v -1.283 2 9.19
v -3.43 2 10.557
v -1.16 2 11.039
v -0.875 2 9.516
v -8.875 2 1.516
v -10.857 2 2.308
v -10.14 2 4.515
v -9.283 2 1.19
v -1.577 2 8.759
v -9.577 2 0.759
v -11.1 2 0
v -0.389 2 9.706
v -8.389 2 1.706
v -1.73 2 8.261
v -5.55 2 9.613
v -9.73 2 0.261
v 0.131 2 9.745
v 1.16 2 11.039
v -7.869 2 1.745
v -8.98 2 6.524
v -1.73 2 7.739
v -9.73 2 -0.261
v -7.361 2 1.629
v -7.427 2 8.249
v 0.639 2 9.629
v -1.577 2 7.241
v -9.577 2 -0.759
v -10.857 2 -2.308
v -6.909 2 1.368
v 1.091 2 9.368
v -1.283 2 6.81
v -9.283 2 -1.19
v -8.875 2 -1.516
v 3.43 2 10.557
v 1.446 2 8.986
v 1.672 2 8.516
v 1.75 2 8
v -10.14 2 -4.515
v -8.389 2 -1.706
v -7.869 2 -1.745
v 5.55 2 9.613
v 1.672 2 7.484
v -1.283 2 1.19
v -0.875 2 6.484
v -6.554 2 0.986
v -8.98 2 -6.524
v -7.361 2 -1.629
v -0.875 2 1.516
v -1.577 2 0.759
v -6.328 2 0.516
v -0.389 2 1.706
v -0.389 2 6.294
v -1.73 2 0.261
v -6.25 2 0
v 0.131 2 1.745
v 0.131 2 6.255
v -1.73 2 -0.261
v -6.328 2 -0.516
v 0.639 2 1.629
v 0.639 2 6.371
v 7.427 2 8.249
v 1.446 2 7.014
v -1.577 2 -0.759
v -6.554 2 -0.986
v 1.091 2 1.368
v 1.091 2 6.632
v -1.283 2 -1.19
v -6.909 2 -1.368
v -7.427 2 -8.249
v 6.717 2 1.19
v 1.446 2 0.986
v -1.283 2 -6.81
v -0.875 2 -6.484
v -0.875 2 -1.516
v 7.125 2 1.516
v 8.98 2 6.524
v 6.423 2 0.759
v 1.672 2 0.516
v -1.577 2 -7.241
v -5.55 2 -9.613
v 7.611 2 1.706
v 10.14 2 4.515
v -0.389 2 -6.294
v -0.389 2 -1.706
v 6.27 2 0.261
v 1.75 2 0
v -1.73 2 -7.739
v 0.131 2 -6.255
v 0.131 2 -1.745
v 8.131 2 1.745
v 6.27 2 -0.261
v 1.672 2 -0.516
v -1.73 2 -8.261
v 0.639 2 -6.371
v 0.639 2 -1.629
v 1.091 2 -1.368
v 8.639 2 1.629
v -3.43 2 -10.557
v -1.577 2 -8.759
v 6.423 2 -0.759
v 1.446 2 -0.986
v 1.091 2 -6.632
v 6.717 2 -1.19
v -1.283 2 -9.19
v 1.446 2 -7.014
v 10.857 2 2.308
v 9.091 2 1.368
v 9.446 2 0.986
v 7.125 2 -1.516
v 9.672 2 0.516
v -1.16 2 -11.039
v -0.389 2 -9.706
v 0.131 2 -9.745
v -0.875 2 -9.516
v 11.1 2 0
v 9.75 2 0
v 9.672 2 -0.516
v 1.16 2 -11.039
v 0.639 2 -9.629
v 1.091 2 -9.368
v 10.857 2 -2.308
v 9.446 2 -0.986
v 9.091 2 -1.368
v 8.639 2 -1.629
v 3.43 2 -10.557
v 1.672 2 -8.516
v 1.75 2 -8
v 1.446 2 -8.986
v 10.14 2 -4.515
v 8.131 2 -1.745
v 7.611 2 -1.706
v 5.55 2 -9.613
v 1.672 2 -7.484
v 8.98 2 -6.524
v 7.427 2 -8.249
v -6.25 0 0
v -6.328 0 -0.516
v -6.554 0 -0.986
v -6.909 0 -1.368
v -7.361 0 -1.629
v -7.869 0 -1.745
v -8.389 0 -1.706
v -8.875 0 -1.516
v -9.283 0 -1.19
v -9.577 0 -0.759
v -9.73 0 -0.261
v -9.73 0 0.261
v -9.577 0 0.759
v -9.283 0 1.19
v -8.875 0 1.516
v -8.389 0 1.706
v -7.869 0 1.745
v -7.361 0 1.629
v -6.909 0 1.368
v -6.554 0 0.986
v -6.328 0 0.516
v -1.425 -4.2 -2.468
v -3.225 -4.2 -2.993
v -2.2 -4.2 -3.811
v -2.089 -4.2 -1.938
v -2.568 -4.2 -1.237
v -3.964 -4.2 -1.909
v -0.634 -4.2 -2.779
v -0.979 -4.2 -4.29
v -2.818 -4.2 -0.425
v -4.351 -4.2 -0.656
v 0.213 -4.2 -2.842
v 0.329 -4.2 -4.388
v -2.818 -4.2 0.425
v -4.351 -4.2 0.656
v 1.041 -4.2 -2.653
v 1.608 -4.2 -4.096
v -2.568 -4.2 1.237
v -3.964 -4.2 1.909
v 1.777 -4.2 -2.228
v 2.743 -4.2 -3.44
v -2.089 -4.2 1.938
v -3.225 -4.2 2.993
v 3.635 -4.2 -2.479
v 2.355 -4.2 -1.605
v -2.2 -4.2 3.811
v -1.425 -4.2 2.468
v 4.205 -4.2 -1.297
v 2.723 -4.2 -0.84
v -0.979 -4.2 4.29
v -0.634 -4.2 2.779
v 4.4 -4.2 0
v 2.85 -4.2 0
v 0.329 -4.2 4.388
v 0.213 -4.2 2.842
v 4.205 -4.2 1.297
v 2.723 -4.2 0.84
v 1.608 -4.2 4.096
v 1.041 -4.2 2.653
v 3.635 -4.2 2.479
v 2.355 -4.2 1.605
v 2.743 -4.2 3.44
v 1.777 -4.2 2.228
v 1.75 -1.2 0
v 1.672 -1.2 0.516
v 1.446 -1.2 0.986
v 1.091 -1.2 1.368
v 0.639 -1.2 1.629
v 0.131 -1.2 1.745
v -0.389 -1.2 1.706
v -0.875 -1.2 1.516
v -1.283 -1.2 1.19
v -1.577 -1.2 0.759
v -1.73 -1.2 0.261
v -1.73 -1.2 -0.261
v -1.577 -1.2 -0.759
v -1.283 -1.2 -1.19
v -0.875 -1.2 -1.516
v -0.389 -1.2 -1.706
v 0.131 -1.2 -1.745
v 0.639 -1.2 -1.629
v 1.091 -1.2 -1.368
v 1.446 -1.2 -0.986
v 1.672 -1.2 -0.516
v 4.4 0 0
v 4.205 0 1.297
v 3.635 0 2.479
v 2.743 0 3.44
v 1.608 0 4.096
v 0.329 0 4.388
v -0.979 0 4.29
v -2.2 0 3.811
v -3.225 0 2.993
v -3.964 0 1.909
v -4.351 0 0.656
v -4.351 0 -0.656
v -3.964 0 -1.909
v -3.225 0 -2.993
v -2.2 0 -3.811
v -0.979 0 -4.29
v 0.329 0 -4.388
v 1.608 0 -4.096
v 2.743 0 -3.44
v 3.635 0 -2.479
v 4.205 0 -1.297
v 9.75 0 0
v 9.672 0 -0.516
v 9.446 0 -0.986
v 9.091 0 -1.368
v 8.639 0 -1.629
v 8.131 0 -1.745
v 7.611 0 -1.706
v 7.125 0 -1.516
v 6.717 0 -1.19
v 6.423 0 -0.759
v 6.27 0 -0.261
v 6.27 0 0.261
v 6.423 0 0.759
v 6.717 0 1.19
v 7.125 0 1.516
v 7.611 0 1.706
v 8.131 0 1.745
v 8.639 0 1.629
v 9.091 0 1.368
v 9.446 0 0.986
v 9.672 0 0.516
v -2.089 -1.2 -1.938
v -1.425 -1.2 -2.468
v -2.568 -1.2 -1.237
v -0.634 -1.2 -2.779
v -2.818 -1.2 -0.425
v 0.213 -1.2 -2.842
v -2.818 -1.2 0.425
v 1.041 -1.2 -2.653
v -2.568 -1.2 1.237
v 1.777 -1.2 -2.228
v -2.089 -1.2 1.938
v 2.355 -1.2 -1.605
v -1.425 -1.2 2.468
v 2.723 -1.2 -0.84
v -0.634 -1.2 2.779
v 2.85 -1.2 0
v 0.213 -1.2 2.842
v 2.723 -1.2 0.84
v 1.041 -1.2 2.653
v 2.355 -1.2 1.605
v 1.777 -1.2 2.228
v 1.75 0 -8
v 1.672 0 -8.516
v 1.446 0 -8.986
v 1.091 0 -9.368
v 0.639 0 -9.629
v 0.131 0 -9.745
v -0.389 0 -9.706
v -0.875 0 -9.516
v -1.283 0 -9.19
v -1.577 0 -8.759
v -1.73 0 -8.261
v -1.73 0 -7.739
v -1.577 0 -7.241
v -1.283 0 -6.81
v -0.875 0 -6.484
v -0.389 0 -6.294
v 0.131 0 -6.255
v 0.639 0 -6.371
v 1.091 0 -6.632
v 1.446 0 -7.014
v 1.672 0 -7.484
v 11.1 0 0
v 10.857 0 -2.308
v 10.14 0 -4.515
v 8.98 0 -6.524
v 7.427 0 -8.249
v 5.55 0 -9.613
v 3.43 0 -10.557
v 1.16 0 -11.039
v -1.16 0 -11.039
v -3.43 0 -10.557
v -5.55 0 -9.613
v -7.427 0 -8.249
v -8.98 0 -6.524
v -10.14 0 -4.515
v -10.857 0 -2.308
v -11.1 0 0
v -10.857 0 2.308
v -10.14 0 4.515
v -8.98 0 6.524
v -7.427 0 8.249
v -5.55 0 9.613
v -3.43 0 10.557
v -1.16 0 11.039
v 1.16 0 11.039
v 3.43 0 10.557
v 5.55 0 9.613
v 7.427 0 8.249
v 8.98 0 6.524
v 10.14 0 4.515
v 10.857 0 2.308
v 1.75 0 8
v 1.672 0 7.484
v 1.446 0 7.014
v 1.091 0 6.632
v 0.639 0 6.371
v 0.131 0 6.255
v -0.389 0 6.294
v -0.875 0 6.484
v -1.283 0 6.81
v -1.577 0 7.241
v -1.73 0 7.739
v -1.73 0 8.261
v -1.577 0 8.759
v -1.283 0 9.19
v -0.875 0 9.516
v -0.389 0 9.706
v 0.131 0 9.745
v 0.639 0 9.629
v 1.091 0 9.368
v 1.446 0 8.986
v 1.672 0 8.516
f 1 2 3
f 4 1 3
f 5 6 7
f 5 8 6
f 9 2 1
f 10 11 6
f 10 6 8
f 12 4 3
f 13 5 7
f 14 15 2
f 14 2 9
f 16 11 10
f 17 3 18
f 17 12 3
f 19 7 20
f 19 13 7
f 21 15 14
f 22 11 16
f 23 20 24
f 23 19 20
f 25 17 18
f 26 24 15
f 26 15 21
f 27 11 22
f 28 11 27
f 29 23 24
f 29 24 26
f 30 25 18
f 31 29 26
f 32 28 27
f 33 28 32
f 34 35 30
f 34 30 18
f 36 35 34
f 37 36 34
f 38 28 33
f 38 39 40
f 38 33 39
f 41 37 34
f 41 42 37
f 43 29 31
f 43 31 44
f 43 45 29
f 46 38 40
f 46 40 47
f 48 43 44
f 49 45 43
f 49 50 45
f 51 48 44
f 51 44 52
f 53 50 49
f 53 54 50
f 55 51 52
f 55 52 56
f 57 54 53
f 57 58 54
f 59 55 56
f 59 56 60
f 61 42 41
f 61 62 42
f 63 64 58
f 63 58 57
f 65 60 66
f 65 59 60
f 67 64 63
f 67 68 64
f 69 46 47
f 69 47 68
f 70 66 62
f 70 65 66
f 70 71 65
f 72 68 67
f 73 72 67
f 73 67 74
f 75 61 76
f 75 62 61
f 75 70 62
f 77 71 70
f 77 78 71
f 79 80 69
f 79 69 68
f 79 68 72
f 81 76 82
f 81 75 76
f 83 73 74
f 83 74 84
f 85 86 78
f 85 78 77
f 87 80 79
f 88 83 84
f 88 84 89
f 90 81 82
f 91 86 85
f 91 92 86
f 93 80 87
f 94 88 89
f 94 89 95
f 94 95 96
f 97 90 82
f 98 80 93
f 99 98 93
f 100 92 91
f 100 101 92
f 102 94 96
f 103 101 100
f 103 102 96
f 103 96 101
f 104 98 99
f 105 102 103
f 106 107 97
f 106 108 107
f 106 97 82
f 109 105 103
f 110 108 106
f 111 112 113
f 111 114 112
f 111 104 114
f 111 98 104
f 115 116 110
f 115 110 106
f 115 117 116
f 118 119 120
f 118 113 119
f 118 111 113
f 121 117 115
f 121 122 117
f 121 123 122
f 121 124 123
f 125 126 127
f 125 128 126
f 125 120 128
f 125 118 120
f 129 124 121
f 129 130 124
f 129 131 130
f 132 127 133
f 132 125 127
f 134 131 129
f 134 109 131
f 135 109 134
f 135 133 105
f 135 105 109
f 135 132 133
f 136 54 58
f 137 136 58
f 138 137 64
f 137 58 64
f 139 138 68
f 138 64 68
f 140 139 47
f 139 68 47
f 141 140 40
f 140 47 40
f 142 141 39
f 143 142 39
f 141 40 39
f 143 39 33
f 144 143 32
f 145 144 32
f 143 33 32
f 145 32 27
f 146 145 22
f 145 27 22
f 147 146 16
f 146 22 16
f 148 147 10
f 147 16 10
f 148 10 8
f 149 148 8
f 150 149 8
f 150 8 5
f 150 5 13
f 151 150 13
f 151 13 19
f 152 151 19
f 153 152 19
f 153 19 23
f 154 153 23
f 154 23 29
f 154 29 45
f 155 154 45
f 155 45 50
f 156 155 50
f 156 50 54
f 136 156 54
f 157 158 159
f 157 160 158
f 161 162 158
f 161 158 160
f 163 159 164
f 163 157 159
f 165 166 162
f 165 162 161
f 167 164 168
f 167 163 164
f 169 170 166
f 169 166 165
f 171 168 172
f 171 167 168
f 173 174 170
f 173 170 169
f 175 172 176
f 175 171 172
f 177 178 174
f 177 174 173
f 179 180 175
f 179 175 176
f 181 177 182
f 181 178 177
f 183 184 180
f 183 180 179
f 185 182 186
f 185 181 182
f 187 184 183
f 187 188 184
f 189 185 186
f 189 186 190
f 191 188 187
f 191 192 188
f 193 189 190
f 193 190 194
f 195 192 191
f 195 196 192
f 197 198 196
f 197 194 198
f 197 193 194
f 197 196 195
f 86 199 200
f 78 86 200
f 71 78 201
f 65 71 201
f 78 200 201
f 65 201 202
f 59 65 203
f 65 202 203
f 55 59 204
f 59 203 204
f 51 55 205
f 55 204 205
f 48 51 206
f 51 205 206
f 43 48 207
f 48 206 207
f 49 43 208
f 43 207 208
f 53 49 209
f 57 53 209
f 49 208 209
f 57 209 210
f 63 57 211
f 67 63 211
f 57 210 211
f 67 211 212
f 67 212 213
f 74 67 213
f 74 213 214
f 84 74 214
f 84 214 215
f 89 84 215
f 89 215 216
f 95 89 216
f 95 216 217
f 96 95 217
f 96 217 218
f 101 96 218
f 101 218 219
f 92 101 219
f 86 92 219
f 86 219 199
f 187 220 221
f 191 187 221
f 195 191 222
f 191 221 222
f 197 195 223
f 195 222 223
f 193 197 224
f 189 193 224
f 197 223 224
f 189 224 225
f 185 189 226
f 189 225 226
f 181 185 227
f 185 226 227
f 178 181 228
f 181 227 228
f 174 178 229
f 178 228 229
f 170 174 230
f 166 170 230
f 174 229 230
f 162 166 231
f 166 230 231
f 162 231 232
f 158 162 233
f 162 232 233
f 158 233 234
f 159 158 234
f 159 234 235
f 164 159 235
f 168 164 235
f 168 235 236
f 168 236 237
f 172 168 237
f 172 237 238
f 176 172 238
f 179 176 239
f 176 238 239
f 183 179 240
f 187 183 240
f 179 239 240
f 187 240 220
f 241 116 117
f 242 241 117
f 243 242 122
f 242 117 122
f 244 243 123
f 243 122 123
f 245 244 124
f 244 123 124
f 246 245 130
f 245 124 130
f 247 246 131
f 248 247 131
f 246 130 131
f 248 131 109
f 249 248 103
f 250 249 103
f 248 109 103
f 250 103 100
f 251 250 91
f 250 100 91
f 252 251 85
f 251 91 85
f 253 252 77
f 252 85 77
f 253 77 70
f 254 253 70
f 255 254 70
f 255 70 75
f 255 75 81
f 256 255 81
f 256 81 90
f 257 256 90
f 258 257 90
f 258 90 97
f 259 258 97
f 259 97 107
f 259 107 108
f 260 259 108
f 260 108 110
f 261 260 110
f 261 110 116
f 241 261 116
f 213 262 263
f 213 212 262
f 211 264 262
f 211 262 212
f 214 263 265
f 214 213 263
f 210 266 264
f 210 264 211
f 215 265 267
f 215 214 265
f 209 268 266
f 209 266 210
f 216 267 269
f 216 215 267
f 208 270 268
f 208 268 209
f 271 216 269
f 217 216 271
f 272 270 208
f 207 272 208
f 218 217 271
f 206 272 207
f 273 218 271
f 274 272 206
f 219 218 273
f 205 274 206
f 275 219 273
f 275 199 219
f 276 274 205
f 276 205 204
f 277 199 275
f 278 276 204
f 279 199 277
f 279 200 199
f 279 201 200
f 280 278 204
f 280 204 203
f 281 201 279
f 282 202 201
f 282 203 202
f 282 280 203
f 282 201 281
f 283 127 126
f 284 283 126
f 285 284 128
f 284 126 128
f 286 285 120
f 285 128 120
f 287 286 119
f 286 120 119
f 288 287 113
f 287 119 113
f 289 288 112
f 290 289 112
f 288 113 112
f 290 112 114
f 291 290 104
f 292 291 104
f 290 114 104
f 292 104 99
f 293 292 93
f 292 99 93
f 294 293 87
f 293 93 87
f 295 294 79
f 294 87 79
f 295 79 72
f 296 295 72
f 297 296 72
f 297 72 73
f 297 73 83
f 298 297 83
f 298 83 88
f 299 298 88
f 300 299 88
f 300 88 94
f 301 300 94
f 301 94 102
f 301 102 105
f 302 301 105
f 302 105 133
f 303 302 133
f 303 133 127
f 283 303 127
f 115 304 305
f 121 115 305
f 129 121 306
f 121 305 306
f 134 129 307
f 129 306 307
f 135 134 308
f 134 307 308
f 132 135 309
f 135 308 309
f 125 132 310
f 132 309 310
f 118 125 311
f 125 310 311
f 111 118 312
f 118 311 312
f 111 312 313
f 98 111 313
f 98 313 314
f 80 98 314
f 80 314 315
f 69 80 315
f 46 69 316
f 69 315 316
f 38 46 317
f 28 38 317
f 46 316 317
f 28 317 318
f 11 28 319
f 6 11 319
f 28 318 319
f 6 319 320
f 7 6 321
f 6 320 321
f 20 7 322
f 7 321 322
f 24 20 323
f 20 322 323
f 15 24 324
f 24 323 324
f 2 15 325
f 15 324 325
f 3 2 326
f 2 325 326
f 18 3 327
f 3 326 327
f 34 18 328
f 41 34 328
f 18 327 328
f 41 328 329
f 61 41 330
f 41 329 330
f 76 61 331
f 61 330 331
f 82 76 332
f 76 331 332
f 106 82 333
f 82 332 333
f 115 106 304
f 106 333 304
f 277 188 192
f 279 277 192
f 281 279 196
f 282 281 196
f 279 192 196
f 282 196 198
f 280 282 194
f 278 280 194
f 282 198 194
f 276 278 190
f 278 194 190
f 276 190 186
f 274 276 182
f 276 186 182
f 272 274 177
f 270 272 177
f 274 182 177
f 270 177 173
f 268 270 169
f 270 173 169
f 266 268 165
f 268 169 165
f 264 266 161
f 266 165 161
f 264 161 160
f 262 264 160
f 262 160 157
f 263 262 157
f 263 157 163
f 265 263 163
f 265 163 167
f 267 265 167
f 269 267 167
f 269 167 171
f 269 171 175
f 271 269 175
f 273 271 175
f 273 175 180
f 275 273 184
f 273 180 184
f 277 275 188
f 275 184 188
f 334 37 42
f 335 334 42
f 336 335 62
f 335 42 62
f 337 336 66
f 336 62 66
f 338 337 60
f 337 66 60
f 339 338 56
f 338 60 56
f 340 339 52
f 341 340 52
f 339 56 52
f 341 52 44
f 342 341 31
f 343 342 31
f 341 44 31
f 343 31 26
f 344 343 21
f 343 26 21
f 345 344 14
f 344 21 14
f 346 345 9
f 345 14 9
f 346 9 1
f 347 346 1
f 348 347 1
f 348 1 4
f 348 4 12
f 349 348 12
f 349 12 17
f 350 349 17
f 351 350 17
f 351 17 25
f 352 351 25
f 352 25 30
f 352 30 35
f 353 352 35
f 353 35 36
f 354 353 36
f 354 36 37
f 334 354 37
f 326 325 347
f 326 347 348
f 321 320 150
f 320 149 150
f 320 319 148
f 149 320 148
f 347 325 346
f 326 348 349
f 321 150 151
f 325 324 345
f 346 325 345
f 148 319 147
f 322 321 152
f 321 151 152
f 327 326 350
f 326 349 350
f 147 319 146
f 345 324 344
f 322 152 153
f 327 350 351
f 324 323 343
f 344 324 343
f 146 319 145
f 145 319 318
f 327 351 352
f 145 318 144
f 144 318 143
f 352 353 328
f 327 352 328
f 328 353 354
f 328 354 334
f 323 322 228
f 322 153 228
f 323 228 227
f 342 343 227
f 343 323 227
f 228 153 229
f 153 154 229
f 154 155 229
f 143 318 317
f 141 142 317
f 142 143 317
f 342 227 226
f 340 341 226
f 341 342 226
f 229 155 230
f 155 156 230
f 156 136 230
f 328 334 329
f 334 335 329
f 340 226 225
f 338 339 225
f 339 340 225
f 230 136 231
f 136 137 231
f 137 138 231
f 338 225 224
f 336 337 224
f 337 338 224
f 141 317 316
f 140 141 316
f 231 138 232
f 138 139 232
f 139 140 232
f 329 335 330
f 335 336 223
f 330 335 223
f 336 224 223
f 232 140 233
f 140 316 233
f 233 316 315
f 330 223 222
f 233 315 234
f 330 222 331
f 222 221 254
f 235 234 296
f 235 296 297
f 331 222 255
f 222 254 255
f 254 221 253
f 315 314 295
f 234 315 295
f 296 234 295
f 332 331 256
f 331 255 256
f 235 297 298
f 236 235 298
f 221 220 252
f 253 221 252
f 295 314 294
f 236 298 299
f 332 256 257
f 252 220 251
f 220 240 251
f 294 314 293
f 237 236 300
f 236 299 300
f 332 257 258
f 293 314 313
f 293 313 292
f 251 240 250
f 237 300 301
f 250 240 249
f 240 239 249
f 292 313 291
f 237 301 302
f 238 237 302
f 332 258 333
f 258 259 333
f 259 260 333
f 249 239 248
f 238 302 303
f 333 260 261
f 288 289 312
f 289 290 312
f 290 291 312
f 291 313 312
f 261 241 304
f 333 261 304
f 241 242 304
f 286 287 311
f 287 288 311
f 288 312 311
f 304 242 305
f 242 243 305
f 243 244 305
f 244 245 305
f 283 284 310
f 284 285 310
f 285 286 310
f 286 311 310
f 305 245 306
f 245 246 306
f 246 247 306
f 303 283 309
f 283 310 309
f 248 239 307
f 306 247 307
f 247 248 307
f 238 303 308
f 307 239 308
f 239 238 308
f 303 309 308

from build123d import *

# Parameters (mm, degrees)
SKETCH1_R          = 11.1
EXTRUDE1_DEPTH     = 2
SKETCH2_R          = 1.75
CUT_EXTRUDE1_DEPTH = 3
SKETCH3_R          = 4.4
EXTRUDE2_DEPTH     = 4.2
SKETCH4_R          = 2.85
CUT_EXTRUDE2_DEPTH = 3
SKETCH5_R          = 1.75
CUT_EXTRUDE3_DEPTH = 4.2


with BuildPart() as part:
    # Sketch1 → Extrude1 (new body)
    with BuildSketch(Plane(origin=(0, 0, 0), x_dir=(1, 0, 0), z_dir=(0, 1, 0))):
        Circle(SKETCH1_R)
    extrude(amount=EXTRUDE1_DEPTH)

    # Sketch2 → Cut-Extrude1 (cut, through all)
    with BuildSketch(Plane(origin=(0, 2, 0), x_dir=(1, 0, 0), z_dir=(0, 1, 0))):
        with Locations((0, 8)):
            Circle(SKETCH2_R)
        with Locations((8, 0)):
            Circle(SKETCH2_R)
        with Locations((0, -8)):
            Circle(SKETCH2_R)
        with Locations((-8, 0)):
            Circle(SKETCH2_R)
    extrude(amount=-CUT_EXTRUDE1_DEPTH, mode=Mode.SUBTRACT)

    # Sketch3 → Extrude2 (add)
    with BuildSketch(Plane.XZ):
        Circle(SKETCH3_R)
    extrude(amount=EXTRUDE2_DEPTH)

    # Sketch4 → Cut-Extrude2 (cut)
    with BuildSketch(Plane.XZ.offset(4.2)):
        Circle(SKETCH4_R)
    extrude(amount=-CUT_EXTRUDE2_DEPTH, mode=Mode.SUBTRACT)

    # Sketch5 → Cut-Extrude3 (cut, through all)
    with BuildSketch(Plane.XZ.offset(1.2)):
        Circle(SKETCH5_R)
    extrude(amount=-CUT_EXTRUDE3_DEPTH, mode=Mode.SUBTRACT)


solid = part.part
